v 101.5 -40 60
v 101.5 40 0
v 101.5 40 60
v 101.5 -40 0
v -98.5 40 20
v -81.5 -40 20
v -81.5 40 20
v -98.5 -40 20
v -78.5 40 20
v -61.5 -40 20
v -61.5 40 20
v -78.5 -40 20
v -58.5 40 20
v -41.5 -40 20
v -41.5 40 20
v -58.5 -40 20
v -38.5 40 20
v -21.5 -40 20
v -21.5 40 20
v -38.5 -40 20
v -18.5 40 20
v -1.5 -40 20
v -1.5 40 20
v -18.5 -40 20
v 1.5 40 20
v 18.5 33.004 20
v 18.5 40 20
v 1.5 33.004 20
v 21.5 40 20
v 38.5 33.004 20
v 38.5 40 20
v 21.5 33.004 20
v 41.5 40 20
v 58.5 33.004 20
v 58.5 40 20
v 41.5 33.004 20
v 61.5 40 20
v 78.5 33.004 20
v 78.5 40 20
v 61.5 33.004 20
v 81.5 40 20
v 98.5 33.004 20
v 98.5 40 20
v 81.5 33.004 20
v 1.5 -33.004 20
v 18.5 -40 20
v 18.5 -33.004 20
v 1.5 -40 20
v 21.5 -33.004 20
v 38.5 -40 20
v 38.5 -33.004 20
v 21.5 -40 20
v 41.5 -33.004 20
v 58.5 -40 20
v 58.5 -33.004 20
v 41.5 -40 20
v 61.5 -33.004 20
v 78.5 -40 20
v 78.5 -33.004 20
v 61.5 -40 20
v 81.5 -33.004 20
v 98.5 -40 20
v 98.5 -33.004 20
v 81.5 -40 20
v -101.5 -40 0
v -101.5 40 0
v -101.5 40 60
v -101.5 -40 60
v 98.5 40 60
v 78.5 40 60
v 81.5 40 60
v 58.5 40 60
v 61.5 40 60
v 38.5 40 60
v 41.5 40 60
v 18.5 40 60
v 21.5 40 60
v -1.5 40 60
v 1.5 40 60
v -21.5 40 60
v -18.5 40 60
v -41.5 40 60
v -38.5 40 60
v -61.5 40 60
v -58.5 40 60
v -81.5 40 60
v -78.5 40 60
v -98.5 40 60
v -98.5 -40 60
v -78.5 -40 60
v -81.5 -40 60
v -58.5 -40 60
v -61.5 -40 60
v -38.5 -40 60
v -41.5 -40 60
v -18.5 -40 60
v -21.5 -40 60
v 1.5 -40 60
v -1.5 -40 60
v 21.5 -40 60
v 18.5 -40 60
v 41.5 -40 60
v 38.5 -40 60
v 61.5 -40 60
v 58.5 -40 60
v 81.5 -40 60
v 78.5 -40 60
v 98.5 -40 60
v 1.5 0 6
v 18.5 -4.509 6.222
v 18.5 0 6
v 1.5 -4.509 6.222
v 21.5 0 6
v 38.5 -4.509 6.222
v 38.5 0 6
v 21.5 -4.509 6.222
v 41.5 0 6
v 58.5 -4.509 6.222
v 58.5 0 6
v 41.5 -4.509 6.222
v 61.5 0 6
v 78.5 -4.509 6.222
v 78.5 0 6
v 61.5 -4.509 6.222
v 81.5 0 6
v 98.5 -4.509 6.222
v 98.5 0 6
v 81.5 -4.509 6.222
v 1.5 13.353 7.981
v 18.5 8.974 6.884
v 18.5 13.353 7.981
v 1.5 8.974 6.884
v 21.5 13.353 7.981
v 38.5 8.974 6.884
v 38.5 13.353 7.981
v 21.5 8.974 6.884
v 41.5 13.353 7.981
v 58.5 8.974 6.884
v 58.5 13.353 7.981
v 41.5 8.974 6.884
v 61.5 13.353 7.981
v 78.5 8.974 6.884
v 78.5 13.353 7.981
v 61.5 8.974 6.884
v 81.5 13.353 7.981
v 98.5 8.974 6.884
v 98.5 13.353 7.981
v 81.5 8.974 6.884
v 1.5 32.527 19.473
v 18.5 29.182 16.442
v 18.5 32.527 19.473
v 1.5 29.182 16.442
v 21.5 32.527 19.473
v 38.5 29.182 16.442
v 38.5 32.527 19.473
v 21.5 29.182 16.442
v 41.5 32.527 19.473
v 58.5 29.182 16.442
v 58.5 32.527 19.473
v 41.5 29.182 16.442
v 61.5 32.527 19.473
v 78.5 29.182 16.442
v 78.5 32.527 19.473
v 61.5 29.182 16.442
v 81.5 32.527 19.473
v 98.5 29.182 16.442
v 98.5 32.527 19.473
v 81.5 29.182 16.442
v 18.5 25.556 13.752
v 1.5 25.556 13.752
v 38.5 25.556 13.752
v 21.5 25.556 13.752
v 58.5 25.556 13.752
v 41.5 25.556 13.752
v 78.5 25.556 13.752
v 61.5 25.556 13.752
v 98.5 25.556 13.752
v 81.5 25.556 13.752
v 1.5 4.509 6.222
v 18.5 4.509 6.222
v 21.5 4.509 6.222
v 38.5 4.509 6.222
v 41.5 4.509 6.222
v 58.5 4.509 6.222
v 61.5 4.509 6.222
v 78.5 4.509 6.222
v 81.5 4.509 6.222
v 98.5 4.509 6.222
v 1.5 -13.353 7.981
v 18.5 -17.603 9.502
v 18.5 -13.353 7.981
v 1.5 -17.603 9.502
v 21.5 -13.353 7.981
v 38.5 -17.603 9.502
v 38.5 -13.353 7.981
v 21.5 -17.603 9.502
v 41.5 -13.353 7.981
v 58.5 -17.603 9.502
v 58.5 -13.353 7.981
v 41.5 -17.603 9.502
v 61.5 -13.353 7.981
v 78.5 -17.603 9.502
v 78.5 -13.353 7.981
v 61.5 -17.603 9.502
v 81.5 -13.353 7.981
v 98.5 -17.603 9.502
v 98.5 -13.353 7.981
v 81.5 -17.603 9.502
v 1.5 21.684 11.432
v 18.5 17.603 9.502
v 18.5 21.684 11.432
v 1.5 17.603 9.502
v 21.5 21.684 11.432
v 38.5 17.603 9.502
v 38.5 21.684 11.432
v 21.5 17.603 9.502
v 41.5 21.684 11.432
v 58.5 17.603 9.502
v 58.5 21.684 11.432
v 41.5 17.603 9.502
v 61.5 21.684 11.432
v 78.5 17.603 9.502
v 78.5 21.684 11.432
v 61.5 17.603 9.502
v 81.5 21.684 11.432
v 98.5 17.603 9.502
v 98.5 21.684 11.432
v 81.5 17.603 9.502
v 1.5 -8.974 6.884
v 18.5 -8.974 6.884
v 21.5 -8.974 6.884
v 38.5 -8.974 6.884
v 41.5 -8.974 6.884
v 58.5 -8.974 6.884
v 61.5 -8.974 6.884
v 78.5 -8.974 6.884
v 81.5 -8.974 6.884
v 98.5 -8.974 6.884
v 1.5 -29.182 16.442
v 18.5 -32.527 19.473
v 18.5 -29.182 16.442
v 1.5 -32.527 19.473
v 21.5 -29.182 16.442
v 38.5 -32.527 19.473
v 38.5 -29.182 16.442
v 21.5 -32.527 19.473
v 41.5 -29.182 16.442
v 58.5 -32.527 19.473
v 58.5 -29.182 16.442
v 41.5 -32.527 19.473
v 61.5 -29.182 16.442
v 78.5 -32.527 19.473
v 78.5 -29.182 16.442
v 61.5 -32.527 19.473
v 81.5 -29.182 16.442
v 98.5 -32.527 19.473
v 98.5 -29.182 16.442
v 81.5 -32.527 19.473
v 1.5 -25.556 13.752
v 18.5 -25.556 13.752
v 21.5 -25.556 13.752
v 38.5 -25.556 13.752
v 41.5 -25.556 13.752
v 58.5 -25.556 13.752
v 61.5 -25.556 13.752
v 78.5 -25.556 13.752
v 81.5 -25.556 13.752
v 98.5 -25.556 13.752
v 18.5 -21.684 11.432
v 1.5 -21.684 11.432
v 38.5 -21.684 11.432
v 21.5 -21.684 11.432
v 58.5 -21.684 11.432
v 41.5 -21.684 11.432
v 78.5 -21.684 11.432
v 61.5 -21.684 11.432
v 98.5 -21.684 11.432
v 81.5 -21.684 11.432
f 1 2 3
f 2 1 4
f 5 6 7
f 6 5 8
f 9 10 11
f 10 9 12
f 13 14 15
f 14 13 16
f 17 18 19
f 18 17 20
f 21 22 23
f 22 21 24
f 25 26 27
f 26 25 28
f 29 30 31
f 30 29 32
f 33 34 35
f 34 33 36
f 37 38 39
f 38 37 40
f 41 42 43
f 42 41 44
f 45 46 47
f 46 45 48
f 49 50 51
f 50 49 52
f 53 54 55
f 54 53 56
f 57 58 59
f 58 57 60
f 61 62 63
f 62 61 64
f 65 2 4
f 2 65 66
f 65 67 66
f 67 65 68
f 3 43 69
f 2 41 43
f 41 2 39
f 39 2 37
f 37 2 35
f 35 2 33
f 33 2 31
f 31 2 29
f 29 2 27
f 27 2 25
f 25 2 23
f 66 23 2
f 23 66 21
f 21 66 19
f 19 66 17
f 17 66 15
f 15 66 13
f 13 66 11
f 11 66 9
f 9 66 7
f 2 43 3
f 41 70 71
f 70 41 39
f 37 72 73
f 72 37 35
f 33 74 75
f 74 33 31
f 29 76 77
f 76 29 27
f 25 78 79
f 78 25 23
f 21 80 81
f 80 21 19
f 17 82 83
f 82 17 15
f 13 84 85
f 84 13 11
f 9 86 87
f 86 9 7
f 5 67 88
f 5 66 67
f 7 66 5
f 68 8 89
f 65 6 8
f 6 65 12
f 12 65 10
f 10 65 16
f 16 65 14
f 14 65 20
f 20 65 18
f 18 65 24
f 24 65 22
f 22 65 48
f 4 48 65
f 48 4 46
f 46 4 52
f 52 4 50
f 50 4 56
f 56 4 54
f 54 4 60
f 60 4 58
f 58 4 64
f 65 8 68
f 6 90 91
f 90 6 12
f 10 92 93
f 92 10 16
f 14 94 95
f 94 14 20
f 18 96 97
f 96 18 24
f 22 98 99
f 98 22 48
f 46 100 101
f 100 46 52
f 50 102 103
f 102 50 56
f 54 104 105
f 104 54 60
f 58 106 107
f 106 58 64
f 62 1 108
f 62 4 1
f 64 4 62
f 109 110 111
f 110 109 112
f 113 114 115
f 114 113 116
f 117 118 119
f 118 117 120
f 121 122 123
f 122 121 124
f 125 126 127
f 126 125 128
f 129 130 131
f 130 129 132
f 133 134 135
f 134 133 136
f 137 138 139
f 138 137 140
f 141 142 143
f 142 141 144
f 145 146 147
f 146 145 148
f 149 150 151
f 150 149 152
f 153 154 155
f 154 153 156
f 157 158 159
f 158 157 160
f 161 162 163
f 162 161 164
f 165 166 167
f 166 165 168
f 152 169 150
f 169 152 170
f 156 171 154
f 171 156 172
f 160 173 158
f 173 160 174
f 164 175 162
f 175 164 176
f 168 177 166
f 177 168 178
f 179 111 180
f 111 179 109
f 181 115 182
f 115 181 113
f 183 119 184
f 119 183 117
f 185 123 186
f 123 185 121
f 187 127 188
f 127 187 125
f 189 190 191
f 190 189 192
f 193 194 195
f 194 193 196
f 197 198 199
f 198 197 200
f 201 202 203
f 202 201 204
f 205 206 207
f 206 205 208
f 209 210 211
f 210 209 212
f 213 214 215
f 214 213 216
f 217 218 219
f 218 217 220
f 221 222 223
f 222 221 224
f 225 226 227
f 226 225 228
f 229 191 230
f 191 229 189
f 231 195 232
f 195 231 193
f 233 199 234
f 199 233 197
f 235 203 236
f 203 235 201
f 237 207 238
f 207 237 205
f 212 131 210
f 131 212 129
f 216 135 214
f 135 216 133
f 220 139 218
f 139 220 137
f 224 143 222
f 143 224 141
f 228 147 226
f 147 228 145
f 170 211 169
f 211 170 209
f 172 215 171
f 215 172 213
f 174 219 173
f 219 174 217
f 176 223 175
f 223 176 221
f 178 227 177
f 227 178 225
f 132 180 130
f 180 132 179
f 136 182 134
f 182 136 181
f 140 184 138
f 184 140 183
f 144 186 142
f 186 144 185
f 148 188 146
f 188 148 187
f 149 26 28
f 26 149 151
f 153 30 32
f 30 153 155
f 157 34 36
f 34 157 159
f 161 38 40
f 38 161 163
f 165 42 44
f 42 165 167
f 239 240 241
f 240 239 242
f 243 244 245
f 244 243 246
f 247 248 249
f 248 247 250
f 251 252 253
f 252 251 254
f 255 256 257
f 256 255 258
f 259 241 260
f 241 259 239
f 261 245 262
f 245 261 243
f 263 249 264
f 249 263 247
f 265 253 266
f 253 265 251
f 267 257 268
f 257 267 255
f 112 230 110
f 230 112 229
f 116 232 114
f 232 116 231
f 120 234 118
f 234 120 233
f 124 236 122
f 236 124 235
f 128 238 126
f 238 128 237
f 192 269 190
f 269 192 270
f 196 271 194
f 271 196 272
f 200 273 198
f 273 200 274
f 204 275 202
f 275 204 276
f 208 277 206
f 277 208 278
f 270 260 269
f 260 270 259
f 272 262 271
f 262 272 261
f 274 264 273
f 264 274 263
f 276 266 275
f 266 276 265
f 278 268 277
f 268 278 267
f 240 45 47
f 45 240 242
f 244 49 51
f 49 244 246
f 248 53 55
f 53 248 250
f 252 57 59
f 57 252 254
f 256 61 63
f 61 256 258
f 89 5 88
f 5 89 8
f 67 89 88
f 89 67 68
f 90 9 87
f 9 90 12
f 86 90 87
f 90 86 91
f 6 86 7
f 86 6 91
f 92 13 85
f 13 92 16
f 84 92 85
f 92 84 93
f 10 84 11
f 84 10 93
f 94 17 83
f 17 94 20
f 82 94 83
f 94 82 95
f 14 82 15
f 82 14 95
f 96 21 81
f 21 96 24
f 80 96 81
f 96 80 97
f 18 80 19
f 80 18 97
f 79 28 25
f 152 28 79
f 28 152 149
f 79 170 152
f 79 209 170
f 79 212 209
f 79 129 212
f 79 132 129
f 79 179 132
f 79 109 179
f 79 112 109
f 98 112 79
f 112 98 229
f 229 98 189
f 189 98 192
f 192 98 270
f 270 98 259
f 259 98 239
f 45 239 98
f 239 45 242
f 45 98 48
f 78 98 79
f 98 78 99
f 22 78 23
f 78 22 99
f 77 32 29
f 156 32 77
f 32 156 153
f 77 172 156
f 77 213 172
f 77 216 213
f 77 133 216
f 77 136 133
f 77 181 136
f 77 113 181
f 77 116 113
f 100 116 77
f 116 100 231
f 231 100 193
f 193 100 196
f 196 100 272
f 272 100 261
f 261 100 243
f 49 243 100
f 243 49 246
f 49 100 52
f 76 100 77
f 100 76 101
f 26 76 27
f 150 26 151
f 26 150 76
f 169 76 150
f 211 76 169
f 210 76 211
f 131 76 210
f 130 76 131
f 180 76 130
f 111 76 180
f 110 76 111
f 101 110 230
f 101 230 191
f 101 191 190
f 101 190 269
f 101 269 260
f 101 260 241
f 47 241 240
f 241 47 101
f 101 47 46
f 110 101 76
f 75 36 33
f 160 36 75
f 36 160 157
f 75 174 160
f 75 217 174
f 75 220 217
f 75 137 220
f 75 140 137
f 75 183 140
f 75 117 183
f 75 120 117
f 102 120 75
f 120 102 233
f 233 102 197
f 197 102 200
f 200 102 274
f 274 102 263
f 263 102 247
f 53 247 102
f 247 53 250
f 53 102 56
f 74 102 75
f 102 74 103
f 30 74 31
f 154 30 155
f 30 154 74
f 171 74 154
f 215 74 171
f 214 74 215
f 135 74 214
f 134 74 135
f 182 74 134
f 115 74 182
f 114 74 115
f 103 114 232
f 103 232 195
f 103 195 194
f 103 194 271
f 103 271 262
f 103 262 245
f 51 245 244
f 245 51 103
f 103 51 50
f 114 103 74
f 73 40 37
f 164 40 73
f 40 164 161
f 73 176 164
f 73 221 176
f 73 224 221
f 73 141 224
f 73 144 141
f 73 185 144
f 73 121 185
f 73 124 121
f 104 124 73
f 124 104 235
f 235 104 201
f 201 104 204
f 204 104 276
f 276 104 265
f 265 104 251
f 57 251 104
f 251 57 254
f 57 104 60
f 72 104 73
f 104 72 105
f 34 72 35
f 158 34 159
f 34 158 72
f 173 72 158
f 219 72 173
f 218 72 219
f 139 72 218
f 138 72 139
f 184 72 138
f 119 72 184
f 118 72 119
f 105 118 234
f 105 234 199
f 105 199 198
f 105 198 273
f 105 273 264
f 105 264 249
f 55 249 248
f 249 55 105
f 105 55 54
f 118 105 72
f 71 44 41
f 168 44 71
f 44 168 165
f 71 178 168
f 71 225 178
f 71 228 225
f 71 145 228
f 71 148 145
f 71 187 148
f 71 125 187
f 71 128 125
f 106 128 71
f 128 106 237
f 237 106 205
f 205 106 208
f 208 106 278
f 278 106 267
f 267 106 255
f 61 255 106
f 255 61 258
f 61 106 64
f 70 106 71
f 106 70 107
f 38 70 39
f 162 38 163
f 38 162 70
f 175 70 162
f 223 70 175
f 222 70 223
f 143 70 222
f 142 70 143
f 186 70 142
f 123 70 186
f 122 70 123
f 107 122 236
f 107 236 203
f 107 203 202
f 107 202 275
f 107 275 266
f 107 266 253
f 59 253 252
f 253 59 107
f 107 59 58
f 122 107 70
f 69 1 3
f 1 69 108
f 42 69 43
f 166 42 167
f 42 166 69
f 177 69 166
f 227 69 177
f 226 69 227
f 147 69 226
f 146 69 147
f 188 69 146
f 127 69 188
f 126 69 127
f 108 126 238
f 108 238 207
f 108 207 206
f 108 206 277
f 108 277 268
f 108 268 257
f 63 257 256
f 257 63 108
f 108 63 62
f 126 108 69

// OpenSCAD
// Petri Dish Rack for 10 dishes (90mm diameter)
// Corrected to ensure the cradle is cut into the base and dividers are solid.

// --- Dimensions ---
base_length = 203;          // X dimension of the base
base_width = 80;            // Y dimension of the base
base_height = 20;           // Z dimension of the base

dish_radius = 45;           // Radius of 90mm dish
cradle_radius = 46;         // Radius of the cutting cylinder
cradle_z_offset = 52;       // Z-coordinate of the cylinder axis
// Cradle bottom is at 52 - 46 = 6mm. Since base is 20mm, it cuts into the base.

num_dividers = 11;          // Number of solid divider plates
divider_thickness = 3;      // Thickness of each divider (X)
divider_height = 60;        // Height of dividers (Z)
divider_spacing_x = 20;     // Distance between divider centers (X)

// --- Constants ---
$fn = 64;

// --- Implementation ---

// The specification requires:
// 1. A base 203x80x20.
// 2. A cradle cut along the whole length of the base.
// 3. Eleven dividers (3mm thick) rising from Z=0 to Z=60.
// 4. The cradle is NOT cut through the dividers.

// To achieve this, we build the base with the cradle cut out, 
// then union the dividers on top.

union() {
    // Part 1: The Base with the cradle cut out
    difference() {
        // The Base Block
        translate([-base_length/2, -base_width/2, 0])
            cube([base_length, base_width, base_height]);
        
        // The Cradle Cut
        // The cylinder axis is at Y=0, Z=52, running along X.
        // We translate the cylinder so its axis is at the correct Z.
        // We use a large enough height to ensure it cuts through the base.
        translate([0, 0, cradle_z_offset])
        rotate([0, 90, 0])
            cylinder(h = base_length + 2, r = cradle_radius);
    }

    // Part 2: The Dividers
    // These rise from Z=0 to Z=60.
    // They are added via union, so they are not affected by the difference() above.
    for (i = [0 : num_dividers - 1]) {
        // X positions: -100, -80, ..., 100
        x_pos = -100 + (i * divider_spacing_x);
        
        translate([x_pos - divider_thickness/2, -base_width/2, 0])
            cube([divider_thickness, base_width, divider_height]);
    }
}

// Logic Verification:
// - Base is 203x80x20, centered on XY, starts at Z=0.
// - Cradle is a cylinder of radius 46, axis at Z=52. 
//   Bottom of cut = 52 - 46 = 6mm. 
//   Since base is 20mm, the cut is visible in the base.
// - Dividers are 3mm thick, 80mm wide, 60mm tall.
// - Dividers are placed at X = -100, -80... 100.
// - Because dividers are added via union() to the result of the difference(),
//   the cradle cut does not penetrate the dividers.
